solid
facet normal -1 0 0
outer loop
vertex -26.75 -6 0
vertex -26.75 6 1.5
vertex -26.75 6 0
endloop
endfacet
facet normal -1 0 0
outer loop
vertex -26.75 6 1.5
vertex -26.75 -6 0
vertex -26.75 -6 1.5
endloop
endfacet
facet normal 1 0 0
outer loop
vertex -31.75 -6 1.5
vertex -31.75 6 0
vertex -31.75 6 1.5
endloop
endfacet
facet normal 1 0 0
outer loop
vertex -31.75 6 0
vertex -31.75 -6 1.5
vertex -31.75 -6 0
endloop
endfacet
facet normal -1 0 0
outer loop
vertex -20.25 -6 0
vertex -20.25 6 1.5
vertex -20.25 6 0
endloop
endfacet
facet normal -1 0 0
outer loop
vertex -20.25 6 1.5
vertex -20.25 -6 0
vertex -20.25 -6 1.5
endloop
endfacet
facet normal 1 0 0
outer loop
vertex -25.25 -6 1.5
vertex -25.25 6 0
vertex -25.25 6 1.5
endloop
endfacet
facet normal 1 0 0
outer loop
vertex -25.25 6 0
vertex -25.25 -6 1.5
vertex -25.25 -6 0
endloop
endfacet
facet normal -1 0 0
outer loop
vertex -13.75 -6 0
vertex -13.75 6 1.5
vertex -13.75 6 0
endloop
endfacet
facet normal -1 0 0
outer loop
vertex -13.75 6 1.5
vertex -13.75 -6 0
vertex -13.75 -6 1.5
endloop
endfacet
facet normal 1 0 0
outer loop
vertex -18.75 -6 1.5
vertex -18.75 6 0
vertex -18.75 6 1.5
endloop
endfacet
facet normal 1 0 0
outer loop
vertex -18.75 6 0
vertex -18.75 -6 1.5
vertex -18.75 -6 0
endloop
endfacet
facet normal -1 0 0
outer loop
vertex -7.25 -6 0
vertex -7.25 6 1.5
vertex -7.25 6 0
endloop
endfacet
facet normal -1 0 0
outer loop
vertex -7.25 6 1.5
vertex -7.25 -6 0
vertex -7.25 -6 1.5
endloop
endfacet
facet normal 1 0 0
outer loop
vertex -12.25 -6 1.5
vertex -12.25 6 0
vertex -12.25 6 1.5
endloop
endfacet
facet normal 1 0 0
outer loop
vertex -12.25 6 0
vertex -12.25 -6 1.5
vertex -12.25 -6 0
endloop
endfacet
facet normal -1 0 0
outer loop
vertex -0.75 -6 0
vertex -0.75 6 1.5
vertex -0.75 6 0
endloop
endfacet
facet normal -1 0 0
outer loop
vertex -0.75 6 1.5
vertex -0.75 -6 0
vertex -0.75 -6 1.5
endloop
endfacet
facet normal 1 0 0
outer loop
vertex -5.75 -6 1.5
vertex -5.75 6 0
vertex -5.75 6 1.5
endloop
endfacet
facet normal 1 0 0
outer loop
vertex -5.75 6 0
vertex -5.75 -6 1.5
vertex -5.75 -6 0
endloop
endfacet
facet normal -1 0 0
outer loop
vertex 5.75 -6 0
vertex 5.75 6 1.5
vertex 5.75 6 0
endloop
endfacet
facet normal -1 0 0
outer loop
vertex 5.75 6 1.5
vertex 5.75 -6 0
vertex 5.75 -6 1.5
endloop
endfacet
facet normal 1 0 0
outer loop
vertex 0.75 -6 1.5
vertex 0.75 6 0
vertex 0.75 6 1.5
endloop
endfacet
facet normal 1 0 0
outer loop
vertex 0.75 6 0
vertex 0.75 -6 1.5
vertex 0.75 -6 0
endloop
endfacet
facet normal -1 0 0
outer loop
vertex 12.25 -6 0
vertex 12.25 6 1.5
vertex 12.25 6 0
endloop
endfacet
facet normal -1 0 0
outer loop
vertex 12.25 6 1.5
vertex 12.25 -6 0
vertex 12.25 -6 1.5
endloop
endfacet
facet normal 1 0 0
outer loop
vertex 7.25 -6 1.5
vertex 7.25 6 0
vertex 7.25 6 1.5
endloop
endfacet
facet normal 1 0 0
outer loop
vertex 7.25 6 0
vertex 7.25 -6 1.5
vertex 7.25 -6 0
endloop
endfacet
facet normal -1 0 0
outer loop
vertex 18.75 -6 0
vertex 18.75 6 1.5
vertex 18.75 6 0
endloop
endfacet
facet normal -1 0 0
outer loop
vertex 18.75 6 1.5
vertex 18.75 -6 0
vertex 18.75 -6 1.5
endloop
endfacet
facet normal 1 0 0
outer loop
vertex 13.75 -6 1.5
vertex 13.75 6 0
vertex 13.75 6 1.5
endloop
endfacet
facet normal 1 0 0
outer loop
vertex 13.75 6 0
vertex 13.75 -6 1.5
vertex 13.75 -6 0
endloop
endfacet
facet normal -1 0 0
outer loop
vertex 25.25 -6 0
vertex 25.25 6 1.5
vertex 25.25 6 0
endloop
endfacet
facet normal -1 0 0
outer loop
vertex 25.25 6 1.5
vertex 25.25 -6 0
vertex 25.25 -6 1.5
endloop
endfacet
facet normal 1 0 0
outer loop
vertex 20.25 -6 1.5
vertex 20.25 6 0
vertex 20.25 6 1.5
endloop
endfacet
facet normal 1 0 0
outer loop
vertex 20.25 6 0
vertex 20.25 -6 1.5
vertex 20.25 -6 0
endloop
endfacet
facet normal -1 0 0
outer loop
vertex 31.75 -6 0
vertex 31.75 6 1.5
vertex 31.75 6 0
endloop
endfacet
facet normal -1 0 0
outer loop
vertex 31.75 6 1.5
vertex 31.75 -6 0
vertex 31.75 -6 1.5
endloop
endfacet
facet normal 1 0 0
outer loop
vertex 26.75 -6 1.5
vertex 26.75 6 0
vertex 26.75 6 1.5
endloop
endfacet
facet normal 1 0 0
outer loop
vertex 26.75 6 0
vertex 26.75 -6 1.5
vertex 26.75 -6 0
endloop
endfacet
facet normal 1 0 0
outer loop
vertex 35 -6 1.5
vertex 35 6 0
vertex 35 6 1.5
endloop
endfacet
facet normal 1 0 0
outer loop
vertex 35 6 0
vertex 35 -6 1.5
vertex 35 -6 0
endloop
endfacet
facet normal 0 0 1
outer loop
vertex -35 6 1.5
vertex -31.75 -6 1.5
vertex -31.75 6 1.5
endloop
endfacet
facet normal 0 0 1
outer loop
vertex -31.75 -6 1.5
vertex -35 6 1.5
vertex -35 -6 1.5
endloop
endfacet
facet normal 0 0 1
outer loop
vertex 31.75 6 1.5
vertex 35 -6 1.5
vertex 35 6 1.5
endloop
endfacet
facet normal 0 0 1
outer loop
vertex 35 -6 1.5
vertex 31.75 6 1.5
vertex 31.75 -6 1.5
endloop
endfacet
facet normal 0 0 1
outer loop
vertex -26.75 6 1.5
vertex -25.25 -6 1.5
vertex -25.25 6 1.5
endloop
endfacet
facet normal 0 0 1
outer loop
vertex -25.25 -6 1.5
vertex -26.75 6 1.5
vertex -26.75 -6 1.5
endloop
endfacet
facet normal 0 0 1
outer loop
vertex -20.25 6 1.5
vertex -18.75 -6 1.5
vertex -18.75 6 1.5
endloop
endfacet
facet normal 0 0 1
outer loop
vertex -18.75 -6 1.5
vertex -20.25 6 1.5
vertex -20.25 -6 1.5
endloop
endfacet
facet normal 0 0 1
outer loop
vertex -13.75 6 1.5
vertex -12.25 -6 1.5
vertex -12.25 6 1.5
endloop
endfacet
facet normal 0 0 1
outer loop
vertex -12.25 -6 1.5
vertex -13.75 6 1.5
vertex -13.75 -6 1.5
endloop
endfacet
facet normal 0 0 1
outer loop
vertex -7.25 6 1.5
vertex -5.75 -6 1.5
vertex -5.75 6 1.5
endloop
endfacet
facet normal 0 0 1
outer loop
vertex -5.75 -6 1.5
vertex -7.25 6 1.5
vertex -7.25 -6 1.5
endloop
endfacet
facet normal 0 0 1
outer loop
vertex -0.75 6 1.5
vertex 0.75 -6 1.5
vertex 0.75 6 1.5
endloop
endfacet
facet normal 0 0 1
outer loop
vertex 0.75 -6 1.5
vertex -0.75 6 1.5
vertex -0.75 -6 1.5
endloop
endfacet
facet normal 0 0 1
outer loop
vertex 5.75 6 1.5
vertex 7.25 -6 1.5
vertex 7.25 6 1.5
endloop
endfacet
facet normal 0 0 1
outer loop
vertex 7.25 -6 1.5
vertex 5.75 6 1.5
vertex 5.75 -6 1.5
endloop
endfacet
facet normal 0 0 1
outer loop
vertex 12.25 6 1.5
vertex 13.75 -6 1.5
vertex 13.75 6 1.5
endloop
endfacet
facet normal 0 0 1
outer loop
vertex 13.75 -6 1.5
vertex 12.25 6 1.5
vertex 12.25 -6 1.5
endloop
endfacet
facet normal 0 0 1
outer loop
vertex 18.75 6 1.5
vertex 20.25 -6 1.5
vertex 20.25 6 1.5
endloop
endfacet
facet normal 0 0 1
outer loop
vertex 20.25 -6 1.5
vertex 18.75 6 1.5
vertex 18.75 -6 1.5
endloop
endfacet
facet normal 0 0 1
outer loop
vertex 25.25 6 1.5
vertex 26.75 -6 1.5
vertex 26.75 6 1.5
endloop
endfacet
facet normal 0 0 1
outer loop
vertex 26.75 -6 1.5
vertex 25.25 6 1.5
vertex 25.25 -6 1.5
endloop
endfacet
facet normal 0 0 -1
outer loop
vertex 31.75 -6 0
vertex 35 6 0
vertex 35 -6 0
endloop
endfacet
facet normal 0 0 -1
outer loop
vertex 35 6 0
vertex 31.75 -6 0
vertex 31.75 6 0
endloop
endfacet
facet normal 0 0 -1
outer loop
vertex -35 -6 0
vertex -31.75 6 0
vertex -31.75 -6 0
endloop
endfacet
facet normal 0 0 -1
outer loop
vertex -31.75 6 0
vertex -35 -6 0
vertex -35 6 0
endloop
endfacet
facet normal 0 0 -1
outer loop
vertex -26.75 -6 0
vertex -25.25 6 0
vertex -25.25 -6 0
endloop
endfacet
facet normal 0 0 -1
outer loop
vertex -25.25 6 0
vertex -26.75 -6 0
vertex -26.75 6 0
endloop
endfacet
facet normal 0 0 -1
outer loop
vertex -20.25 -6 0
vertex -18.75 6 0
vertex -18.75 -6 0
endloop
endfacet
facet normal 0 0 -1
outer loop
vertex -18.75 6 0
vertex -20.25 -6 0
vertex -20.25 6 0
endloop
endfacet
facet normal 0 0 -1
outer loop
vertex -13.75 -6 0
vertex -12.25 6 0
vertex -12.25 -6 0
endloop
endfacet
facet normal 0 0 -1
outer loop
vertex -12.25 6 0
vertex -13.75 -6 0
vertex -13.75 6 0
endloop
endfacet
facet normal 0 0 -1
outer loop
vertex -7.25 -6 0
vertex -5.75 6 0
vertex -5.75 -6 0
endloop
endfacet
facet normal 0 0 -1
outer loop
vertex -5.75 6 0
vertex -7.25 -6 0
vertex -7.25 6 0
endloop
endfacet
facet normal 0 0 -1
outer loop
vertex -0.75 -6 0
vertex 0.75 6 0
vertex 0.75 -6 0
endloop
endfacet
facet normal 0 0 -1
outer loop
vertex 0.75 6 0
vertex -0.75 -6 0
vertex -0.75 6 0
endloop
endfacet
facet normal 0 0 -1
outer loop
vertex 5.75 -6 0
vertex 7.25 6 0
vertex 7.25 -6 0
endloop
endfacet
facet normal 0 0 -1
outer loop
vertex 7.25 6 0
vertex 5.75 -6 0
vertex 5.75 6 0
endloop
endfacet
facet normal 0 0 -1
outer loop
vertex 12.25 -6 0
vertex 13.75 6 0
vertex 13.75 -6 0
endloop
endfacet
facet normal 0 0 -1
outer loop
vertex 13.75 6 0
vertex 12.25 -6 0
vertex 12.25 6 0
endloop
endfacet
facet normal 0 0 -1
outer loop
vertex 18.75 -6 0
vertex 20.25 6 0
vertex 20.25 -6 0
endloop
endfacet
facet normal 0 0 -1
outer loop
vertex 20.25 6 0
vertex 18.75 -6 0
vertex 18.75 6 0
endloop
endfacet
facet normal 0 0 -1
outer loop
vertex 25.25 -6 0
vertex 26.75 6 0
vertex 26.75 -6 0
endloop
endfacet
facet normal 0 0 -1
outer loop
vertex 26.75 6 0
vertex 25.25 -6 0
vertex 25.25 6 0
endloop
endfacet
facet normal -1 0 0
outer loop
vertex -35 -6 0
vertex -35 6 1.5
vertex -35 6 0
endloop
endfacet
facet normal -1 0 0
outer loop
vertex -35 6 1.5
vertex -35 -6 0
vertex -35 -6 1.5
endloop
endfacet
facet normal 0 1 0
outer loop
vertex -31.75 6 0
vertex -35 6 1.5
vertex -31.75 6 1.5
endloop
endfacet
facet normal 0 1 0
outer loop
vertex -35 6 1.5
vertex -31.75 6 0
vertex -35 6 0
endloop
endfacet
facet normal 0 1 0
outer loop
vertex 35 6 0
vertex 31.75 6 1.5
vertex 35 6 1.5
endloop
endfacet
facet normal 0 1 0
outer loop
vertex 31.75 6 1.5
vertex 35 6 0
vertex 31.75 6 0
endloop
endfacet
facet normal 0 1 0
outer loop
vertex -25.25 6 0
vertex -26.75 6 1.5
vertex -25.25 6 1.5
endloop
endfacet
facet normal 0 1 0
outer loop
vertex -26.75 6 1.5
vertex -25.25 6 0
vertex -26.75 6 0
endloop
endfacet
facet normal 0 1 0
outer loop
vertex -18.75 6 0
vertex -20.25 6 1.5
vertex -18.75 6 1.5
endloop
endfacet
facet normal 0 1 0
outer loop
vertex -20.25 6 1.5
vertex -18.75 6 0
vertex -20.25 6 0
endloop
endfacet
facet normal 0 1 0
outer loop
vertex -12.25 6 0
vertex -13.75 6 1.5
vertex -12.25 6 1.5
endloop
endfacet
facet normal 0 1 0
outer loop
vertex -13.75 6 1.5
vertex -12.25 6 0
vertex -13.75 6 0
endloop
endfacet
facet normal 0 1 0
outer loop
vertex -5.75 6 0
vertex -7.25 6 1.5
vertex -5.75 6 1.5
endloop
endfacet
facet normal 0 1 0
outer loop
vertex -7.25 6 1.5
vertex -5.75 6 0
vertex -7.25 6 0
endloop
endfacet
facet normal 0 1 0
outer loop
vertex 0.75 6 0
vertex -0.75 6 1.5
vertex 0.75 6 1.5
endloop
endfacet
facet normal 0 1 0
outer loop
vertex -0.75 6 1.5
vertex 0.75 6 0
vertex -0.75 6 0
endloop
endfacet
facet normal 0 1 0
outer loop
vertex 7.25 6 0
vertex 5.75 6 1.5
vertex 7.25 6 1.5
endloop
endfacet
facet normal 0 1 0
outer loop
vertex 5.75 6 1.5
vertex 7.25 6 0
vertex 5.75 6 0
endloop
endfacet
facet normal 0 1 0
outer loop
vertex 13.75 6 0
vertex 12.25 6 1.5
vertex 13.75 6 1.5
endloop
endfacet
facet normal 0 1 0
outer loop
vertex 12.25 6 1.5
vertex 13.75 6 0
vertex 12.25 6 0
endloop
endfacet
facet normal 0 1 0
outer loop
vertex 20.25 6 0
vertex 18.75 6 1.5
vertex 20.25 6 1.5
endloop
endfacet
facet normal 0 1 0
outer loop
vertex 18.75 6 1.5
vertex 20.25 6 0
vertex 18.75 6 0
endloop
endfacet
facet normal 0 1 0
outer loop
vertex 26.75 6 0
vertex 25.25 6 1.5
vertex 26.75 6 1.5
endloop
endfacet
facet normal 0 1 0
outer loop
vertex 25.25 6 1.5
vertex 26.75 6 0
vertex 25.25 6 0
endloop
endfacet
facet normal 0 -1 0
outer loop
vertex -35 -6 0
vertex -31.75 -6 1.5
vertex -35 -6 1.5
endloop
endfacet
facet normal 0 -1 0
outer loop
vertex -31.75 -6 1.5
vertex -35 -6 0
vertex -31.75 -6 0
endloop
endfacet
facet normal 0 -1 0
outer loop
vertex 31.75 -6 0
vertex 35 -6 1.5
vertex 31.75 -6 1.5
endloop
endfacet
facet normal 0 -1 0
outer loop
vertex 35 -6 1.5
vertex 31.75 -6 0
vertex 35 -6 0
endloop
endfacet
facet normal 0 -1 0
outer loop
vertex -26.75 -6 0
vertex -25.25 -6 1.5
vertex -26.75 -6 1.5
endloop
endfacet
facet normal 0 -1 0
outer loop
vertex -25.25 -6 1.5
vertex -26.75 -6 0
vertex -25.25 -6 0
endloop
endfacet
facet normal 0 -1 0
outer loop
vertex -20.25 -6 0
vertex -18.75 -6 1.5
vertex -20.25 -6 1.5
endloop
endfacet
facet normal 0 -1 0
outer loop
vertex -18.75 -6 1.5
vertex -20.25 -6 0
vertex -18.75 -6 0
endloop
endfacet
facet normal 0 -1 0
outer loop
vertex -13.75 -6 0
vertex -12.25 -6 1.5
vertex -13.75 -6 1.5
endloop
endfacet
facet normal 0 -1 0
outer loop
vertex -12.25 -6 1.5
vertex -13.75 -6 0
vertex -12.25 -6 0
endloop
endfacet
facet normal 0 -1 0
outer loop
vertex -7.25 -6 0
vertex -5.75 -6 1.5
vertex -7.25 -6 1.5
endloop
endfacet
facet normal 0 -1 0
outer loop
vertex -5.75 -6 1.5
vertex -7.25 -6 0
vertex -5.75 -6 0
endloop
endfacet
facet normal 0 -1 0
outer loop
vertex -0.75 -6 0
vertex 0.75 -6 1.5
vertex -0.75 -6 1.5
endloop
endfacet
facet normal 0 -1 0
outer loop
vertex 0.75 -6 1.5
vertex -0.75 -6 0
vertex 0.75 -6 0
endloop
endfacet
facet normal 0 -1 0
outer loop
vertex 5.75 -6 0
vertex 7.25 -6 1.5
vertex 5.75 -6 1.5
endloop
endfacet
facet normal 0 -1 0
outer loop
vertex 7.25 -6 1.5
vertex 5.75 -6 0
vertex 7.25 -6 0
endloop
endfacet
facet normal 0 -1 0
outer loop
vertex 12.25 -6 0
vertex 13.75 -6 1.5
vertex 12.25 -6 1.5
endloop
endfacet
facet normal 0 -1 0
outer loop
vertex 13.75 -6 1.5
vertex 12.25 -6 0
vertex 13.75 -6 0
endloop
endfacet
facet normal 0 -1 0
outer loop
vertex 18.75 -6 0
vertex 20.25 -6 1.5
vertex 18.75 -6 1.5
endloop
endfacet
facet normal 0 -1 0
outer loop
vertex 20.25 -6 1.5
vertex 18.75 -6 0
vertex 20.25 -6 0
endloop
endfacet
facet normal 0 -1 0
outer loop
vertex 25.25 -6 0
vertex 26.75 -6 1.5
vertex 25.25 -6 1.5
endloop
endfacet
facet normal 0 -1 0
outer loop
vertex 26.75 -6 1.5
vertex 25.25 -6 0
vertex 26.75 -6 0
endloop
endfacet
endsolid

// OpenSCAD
// 10-well comb for casting agarose gels
// Print orientation: flat on bed, teeth pointing down (-Y)

// ---- Dimensions (mm) ----
plate_t      = 1.5;   // plate thickness (Z)
spine_len    = 70;    // spine length (X)
spine_w      = 12;    // spine width (Y)
tooth_w      = 5.0;   // tooth width (X)
tooth_len    = 12;    // tooth length (Y)
tooth_count  = 10;    // number of teeth
gap          = 1.5;   // gap between teeth (X)
eps          = 0.5;   // cutter overshoot past faces

// ---- Derived ----
pitch   = tooth_w + gap;            // centre-to-centre spacing
x_start = -(tooth_count - 1) * pitch / 2;  // first tooth centre (row centred)

difference() {
    // Base plate
    translate([-spine_len / 2, -spine_w / 2, 0])
        cube([spine_len, spine_w, plate_t]);

    // Teeth cut out from the plate
    for (i = [0 : tooth_count - 1])
        translate([x_start + i * pitch - tooth_w / 2,
                   -tooth_len / 2 - eps,
                   -eps])
            cube([tooth_w, tooth_len + 2 * eps, plate_t + 2 * eps]);
}
